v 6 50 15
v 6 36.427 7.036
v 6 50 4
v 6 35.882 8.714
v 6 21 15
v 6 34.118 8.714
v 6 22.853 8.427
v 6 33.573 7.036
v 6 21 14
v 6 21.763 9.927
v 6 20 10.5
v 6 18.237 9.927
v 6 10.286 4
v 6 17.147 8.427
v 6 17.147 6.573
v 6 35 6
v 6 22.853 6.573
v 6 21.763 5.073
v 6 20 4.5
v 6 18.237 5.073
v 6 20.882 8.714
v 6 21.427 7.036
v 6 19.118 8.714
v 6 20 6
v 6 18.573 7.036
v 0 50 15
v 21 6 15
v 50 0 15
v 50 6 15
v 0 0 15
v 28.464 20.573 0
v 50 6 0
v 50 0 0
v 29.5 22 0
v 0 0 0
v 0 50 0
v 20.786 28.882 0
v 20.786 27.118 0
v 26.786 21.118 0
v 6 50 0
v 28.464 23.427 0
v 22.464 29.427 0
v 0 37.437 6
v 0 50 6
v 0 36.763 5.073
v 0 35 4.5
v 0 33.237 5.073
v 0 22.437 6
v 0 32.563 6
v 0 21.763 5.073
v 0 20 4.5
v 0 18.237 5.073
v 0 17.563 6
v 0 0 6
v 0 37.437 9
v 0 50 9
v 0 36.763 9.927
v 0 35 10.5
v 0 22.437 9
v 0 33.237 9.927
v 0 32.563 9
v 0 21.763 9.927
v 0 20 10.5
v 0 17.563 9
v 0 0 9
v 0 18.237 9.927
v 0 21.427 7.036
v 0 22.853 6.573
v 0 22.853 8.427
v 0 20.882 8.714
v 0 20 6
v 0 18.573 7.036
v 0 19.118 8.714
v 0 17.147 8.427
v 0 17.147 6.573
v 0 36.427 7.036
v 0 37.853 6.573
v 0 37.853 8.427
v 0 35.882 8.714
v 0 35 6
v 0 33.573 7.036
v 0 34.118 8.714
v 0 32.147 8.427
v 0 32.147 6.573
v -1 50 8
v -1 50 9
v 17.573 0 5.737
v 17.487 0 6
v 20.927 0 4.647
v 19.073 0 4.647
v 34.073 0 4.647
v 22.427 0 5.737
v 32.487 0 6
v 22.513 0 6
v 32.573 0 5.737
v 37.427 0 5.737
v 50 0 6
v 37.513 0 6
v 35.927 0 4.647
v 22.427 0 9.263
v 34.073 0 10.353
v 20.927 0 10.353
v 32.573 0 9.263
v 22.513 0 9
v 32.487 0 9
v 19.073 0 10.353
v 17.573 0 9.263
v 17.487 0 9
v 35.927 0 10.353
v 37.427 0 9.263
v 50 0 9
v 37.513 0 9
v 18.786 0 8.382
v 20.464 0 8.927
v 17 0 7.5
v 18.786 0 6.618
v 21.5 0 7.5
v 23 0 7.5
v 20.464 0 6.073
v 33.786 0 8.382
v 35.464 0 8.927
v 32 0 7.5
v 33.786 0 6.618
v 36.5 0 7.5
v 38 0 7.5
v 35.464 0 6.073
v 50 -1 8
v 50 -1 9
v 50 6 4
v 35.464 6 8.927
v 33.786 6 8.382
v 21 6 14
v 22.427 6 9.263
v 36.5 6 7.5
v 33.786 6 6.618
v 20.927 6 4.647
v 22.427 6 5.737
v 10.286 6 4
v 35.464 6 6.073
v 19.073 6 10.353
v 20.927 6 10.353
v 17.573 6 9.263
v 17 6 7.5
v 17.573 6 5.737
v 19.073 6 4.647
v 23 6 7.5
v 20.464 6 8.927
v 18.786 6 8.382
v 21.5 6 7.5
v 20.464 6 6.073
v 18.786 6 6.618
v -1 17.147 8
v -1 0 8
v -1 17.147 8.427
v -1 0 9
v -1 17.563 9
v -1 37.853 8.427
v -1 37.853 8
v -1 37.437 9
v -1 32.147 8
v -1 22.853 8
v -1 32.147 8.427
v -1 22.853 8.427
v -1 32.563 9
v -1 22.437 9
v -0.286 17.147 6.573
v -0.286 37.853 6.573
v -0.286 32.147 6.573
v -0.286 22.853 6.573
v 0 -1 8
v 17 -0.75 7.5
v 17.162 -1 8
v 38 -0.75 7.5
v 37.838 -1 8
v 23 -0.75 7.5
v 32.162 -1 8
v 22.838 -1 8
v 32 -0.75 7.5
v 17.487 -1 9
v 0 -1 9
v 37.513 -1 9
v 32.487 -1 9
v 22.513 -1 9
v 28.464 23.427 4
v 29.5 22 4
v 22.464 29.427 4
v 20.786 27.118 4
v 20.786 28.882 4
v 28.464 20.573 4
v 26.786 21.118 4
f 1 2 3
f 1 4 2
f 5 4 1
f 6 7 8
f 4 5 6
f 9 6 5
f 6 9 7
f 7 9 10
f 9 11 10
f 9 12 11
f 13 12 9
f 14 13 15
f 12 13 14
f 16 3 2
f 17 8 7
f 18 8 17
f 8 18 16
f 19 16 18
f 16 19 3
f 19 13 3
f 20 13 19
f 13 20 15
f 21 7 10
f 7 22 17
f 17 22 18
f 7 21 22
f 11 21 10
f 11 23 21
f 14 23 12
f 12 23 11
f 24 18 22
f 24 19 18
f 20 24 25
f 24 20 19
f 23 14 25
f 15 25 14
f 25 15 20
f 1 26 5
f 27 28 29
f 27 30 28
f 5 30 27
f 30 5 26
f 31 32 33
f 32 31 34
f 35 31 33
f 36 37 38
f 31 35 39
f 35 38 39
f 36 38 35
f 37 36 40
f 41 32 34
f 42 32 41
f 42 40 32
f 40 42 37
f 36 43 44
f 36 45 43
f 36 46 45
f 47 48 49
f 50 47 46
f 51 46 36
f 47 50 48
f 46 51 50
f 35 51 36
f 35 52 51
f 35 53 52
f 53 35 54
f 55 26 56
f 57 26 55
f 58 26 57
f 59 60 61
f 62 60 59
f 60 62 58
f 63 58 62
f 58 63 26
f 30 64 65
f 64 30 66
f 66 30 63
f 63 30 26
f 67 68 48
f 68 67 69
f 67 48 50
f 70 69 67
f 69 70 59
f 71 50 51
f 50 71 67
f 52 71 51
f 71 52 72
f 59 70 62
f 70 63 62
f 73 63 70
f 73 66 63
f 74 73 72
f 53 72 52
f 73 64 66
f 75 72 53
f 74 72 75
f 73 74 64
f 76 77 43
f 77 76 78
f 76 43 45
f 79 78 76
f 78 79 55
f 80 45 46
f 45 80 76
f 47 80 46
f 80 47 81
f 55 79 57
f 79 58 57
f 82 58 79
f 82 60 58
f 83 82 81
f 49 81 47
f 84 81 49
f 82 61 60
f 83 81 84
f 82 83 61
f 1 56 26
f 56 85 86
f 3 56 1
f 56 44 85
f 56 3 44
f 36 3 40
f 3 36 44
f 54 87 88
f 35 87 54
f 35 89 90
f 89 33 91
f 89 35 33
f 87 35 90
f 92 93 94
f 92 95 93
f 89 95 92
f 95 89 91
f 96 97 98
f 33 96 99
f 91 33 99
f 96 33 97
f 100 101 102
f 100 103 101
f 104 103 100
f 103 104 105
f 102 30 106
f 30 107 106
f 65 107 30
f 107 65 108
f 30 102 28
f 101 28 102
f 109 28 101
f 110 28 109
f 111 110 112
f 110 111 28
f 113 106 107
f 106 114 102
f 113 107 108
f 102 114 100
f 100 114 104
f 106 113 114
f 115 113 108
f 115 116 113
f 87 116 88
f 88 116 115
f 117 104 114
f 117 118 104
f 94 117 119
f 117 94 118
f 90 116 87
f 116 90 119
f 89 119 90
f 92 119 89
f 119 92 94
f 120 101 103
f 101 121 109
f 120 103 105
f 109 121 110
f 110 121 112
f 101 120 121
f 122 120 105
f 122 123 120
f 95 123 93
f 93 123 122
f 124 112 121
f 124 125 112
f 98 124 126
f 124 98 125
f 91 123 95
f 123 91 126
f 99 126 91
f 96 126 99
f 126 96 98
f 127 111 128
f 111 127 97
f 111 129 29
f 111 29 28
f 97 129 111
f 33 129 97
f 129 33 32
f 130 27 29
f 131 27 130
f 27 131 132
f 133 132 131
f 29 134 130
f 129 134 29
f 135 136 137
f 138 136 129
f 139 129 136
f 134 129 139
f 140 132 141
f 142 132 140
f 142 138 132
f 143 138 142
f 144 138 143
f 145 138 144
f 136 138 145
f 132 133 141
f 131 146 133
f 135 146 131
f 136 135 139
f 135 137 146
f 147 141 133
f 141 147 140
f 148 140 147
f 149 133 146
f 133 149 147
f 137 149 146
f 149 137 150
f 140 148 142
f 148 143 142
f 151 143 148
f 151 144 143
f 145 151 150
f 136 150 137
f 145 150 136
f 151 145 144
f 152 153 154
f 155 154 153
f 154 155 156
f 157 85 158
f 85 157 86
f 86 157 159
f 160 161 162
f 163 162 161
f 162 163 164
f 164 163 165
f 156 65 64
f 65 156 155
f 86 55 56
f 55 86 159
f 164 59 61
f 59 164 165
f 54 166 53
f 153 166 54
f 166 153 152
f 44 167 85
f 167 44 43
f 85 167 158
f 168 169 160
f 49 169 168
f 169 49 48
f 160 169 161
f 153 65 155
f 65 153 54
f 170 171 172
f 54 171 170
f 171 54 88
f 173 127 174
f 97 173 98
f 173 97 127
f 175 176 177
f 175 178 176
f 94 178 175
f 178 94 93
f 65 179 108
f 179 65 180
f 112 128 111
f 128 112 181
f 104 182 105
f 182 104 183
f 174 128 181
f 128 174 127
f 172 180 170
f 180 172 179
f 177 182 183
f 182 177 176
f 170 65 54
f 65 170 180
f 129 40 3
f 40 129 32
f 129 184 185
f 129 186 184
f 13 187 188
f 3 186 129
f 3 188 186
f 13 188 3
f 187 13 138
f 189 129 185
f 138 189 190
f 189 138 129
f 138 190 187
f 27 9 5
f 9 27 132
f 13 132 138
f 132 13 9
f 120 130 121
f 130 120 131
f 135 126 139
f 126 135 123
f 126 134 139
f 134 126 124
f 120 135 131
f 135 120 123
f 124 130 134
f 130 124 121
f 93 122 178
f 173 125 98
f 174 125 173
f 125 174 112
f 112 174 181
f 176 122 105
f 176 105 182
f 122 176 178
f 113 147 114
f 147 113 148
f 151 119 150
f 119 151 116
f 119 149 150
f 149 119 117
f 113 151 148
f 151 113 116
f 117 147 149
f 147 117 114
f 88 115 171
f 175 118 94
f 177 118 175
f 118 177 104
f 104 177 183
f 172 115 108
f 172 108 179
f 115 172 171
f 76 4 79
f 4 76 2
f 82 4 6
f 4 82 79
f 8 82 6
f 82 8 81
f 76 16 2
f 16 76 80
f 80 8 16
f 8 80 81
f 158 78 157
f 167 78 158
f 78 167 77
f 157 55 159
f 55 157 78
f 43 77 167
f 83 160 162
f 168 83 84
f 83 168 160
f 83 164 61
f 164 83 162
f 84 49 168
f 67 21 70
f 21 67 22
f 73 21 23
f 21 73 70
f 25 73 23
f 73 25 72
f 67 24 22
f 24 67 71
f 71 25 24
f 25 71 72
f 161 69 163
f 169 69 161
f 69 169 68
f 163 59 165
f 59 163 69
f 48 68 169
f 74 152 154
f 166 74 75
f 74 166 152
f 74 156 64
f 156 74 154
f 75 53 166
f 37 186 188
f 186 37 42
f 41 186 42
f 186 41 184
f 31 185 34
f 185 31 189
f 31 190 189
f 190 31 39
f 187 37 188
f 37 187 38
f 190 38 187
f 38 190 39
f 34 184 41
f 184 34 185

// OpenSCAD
Length = 50;
Thickness = 6;
holeDiameter = 3;
Height = 15;



difference()
{
    union()
    {
        walls();
        lip();
        plate();
        brace();
    }
    holes();
    MountingSlot();
}




// slot lip
module lip()
{
    hull()
    {
        translate([-1, 0, Height/2 + .5]) cube ([1,Length,1]);
        translate([0, 0, Height/2 - 1.5]) cube ([1,Length,1]);
    }

    hull()
    {
        translate([ 0,-1, Height/2 + .5]) cube ([Length,1,1]);
        translate([0, 0, Height/2 - 1.5]) cube ([Length,1,1]);
    }
}


module MountingSlot()
{
hull()
{
 translate([Length/2+holeDiameter, Length/2-holeDiameter, 0]) 
      cylinder(d=holeDiameter, h=Thickness +1);
 translate([Length/2-holeDiameter, Length/2+holeDiameter, 0]) 
      cylinder(d=holeDiameter, h=Thickness +1);
}
}

// holes
module holes()
{
translate([Length-15, -.5, Height/2]) 
    rotate([-90,0,0]) 
        cylinder(d=holeDiameter, h=Thickness +1);
translate([Length-15, -Thickness, Height/2]) 
    rotate([-90,0,0]) 
        cylinder(r=holeDiameter, h=Thickness );

translate([Length-15-15, -.5, Height/2]) 
    rotate([-90,0,0]) 
        cylinder(d=holeDiameter, h=Thickness +1);
 translate([Length-15-15, Thickness, Height/2]) 
    rotate([-90,0,0]) 
        cylinder(r=holeDiameter, h=Thickness );
 translate([Length-15-15, -Thickness, Height/2]) 
    rotate([-90,0,0]) 
        cylinder(r=holeDiameter, h=Thickness );
     
  
    
translate([ -.5,Length-15, Height/2]) 
    rotate([0, 90, 0]) 
        cylinder(d=holeDiameter, h=Thickness +1);
translate([ -Thickness,Length-15, Height/2]) 
    rotate([0,90,0]) 
        cylinder(r=holeDiameter, h=Thickness );
    
translate([ -.5,Length-15-15, Height/2]) 
    rotate([0,90,0]) 
        cylinder(d=holeDiameter, h=Thickness +1);
translate([ Thickness,Length-15-15, Height/2]) 
    rotate([0,90,0]) 
        cylinder(r=holeDiameter, h=Thickness );
translate([ -Thickness,Length-15-15, Height/2]) 
    rotate([0,90,0]) 
        cylinder(r=holeDiameter, h=Thickness );
}



module walls()
{
//walls
cube ([Thickness,Length,Height]);
cube ([Length,Thickness,Height]);
}


//angle plate
module plate()
{
hull()
{
    cube ([Thickness,Length,4]);
    cube ([Length,Thickness,4]);
    cube ([1,15,4]);
}
}


// inner brace
module brace()
{
hull()
{
    translate([0,0,Height-1]) cube ([Thickness,Height+Thickness,1]);
    translate([0,0,Height-1]) cube ([Height+Thickness,Thickness,1]);
    cube ([Thickness,Thickness,Height]);
}   
}

